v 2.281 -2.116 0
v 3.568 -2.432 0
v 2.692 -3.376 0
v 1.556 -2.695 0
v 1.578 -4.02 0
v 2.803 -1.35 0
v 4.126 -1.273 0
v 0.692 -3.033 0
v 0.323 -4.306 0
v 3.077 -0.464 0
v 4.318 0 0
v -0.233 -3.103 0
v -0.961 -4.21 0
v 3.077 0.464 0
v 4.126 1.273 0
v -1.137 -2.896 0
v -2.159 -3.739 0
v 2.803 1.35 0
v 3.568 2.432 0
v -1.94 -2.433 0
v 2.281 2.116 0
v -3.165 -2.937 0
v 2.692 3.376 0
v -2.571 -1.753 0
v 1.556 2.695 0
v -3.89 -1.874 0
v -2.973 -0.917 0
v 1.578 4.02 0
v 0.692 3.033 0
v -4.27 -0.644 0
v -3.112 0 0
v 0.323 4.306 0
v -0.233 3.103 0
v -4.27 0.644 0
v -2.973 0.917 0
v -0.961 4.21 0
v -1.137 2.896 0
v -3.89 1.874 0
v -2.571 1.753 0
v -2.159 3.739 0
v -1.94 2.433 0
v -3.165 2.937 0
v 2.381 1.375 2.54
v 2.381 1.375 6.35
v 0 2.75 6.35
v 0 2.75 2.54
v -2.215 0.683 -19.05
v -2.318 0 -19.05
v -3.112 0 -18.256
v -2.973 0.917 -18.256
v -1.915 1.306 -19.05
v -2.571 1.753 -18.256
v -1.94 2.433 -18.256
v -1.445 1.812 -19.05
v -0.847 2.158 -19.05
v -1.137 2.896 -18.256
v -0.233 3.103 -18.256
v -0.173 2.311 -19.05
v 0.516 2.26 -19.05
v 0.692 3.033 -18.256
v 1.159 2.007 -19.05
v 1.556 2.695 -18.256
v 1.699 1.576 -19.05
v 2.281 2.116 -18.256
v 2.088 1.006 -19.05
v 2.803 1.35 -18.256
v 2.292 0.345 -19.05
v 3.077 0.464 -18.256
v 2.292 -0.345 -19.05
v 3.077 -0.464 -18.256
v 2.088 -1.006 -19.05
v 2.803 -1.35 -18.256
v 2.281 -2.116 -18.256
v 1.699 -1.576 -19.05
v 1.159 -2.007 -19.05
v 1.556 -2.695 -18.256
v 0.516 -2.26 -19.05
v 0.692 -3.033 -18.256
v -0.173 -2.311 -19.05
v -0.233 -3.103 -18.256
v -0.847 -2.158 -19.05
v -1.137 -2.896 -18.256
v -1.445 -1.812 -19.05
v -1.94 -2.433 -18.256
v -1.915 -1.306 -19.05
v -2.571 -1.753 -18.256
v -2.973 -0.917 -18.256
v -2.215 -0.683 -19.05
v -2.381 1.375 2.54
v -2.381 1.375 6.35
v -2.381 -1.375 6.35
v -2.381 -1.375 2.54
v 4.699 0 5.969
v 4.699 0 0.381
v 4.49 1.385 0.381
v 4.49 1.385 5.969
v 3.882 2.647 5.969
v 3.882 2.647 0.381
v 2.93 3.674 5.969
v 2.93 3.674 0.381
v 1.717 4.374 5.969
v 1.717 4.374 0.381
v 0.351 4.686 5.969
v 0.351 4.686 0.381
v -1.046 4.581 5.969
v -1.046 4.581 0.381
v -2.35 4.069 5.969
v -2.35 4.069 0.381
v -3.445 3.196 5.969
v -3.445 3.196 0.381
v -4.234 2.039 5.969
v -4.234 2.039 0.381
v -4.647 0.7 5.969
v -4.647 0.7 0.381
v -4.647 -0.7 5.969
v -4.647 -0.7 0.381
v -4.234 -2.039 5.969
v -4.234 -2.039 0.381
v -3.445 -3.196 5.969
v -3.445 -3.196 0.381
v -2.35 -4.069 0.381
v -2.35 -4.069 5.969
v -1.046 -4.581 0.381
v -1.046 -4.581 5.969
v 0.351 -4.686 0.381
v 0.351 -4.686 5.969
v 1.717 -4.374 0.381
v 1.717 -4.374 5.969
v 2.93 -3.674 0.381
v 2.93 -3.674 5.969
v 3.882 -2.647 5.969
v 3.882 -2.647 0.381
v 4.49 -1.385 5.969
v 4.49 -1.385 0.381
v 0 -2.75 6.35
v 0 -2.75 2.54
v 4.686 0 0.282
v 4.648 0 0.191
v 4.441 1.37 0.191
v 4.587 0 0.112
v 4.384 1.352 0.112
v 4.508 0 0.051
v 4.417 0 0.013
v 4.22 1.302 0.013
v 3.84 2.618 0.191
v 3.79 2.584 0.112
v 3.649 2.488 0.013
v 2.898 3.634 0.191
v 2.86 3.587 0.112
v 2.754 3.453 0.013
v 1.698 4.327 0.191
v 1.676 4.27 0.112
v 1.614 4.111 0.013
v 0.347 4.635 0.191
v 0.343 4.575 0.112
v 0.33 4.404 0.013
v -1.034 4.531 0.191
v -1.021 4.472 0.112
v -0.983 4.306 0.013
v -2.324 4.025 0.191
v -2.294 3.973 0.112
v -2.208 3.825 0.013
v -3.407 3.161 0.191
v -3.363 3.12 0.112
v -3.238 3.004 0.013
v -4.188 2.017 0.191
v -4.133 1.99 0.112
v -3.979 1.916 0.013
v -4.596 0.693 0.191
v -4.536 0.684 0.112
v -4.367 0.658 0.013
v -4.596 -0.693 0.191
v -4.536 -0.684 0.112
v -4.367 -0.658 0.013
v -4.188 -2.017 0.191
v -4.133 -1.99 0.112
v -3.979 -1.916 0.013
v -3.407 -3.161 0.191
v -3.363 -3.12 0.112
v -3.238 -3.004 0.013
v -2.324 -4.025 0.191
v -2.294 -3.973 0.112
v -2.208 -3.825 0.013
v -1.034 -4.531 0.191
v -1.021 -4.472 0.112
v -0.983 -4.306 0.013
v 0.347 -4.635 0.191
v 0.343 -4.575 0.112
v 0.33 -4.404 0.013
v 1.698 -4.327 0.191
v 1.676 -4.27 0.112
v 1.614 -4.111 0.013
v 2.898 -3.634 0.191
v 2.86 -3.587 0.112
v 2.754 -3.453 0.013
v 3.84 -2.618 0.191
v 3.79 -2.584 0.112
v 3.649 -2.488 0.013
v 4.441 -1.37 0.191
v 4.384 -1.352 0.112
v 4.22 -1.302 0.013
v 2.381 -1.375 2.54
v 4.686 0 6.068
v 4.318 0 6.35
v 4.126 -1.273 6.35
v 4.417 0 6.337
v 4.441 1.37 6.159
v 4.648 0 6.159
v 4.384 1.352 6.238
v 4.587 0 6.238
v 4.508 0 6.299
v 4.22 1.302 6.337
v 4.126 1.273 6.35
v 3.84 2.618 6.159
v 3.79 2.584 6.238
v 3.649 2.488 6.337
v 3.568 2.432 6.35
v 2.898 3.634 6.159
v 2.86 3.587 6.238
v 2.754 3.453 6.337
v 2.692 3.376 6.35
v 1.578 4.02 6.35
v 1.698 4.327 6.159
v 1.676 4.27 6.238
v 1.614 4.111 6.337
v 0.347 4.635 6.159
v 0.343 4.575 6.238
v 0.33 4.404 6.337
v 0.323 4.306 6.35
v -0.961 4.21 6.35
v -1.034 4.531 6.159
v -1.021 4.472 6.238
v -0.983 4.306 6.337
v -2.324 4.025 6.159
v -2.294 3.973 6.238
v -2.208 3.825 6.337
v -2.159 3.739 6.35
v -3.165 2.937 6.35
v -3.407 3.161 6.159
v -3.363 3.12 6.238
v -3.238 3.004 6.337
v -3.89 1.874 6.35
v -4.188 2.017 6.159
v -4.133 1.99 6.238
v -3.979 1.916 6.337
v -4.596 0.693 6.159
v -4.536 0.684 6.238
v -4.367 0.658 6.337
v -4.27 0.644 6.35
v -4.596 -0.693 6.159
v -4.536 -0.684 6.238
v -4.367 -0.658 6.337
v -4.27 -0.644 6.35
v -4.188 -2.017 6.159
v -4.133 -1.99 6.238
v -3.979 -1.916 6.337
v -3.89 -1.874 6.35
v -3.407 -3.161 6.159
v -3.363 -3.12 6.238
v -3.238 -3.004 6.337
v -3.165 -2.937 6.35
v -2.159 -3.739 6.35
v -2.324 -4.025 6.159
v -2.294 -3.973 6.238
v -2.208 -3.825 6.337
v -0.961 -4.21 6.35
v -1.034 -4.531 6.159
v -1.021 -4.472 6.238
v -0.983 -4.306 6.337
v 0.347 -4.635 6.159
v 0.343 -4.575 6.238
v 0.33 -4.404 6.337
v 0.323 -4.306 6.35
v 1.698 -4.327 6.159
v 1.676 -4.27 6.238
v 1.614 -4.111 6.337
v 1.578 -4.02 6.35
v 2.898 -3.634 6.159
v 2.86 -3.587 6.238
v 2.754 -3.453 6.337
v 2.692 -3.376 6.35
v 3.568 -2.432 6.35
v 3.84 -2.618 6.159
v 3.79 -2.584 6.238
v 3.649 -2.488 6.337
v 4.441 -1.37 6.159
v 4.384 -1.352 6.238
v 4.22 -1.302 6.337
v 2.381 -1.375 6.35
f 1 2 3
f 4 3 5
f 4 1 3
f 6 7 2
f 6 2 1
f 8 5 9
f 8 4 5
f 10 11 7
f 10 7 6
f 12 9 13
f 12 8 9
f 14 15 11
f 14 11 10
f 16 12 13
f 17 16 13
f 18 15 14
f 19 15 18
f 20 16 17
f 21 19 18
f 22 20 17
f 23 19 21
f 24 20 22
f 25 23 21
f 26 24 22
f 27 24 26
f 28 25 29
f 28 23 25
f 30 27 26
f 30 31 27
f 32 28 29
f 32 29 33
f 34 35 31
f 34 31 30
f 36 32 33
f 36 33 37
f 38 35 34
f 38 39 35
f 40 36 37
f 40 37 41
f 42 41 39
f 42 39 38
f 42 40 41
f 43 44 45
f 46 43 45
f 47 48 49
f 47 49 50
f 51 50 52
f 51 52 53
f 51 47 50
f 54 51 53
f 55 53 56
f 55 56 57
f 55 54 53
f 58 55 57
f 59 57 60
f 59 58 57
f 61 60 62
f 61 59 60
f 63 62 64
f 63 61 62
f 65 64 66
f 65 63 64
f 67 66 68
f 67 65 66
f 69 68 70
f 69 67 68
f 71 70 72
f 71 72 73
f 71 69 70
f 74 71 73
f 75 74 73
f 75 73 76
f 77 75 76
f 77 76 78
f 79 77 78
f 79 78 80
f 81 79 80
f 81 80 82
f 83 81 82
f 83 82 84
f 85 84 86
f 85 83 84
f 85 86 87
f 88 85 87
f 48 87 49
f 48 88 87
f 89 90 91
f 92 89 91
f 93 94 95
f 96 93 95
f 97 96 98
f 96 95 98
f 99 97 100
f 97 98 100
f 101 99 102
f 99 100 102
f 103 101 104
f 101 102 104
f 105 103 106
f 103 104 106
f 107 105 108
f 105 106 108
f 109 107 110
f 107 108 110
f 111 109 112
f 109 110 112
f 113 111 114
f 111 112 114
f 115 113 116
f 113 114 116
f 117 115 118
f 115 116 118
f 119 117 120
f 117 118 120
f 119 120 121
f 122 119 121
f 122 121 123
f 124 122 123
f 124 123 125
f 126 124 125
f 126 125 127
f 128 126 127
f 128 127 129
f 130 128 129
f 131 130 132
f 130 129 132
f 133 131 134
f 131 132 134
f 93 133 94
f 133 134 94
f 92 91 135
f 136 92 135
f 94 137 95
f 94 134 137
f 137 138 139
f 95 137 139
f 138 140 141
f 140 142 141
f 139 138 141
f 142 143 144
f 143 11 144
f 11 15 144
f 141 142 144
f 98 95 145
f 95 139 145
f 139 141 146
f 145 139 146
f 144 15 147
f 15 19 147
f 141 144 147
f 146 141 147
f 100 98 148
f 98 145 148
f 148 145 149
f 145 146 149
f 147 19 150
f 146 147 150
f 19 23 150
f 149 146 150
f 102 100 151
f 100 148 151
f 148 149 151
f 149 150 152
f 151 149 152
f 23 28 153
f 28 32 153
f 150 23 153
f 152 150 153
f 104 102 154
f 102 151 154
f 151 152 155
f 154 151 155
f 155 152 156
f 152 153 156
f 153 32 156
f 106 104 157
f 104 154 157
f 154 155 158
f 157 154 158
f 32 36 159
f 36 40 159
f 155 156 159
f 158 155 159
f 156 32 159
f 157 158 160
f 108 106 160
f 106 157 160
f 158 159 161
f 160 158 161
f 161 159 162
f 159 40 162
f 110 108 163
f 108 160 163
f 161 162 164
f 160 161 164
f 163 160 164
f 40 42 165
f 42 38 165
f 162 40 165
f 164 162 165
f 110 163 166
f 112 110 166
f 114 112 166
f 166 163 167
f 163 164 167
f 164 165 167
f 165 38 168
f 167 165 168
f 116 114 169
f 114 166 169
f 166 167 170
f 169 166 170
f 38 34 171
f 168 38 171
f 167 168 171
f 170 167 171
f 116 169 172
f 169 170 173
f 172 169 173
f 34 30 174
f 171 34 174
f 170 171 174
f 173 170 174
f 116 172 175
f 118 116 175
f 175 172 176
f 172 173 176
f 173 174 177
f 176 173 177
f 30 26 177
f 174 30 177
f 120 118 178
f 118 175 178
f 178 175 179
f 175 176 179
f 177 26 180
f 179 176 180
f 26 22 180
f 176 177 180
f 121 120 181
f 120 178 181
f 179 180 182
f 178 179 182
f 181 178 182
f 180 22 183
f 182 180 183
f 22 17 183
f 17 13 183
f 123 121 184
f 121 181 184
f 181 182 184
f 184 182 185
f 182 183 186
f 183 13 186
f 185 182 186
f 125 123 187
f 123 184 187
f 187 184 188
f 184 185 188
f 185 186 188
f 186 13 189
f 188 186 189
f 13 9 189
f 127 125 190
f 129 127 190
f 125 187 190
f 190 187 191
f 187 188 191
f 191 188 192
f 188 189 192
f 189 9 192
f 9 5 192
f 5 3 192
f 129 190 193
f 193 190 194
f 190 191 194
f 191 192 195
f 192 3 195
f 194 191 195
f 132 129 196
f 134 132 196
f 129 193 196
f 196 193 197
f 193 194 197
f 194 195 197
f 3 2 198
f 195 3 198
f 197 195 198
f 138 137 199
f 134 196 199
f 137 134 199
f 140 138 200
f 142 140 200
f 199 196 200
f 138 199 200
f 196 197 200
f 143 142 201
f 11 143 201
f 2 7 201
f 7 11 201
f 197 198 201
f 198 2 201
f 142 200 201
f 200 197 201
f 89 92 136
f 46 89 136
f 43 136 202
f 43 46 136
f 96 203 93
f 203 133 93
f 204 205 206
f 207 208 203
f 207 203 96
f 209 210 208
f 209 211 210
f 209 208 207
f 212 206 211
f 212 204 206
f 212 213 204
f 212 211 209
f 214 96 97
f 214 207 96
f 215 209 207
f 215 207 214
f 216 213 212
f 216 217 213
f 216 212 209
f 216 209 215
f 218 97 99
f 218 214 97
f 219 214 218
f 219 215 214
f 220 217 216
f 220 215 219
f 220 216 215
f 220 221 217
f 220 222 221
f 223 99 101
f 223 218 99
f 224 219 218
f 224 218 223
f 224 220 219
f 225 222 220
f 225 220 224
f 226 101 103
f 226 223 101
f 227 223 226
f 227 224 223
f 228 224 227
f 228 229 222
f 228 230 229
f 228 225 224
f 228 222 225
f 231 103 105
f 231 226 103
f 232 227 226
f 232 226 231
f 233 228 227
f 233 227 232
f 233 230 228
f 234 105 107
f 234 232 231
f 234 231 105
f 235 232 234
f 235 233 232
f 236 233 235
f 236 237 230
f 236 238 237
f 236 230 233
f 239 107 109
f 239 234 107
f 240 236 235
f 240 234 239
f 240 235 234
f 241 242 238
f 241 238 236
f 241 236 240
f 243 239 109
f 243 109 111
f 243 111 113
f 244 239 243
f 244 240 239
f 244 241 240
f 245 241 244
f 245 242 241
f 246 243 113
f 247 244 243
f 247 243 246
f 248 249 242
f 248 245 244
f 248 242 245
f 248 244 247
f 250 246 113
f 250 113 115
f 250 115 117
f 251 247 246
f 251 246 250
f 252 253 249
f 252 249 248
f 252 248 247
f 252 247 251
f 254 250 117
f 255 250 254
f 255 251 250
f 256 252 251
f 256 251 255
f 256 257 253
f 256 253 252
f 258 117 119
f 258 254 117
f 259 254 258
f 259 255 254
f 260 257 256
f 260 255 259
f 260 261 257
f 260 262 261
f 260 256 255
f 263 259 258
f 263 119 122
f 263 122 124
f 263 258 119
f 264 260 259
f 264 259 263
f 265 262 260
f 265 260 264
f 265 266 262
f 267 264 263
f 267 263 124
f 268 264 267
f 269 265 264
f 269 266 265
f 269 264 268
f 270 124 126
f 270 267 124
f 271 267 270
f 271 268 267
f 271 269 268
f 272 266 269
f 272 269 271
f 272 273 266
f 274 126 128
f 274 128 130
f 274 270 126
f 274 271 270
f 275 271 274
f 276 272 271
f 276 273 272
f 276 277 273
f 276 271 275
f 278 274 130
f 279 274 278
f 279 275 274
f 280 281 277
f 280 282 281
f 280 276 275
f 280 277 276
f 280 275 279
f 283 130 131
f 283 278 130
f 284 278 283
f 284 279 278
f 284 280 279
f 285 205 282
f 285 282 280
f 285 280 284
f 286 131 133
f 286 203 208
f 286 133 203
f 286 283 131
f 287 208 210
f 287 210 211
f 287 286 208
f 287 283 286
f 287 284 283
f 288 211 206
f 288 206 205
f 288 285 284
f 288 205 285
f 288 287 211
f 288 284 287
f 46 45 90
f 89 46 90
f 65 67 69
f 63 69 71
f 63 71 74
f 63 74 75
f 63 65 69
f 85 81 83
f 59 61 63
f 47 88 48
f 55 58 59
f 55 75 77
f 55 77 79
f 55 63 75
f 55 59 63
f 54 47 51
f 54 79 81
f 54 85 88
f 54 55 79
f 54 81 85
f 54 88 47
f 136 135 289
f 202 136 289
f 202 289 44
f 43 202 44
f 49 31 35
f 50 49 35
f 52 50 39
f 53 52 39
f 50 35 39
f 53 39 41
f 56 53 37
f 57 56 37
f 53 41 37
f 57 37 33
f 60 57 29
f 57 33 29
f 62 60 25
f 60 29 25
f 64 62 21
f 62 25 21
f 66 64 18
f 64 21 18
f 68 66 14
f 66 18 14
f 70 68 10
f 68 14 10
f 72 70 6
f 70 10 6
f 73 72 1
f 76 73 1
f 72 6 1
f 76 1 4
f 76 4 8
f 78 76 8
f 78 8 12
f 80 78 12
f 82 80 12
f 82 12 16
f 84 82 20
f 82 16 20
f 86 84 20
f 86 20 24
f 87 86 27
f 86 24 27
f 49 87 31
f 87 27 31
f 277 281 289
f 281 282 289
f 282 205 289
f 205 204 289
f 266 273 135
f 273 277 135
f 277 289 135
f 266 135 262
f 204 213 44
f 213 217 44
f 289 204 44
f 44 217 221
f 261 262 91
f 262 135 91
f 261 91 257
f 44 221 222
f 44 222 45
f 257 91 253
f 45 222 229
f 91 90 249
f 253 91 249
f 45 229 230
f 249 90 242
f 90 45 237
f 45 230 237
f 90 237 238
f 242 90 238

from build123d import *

# Parameters (mm, degrees)
SKETCH1_W      = 4.699
SKETCH1_H      = 6.35
SKETCH2_R      = 3.1115
EXTRUDE1_DEPTH = 19.05
EXTRUDE2_DEPTH = 3.81
CHAMFER1_SIZE2 = 0.793750001
CHAMFER1_SIZE  = 0.793749999
FILLET1_R      = 0.381
FILLET2_R      = 0.381


with BuildPart() as part:
    # Sketch1 → Revolve1 (revolve)
    with BuildSketch(Plane(origin=(0, 0, 0), x_dir=(1, 0, 0), z_dir=(0, 1, 0))):
        with Locations((2.3495, -3.175)):
            Rectangle(SKETCH1_W, SKETCH1_H)
    revolve(axis=Axis((0, 0, 0), (0, 0, 1)))

    # Sketch2 → Extrude1 (add)
    with BuildSketch(Plane(origin=(0, 0, 0), x_dir=(-1, 0, 0), z_dir=(0, 0, -1))):
        Circle(SKETCH2_R)
    extrude(amount=EXTRUDE1_DEPTH)

    # Sketch3 → Extrude2 (cut)
    with BuildSketch(Plane.XY.offset(6.35)):
        Polygon((2.38125, 1.374815329), (0, 2.749630657), (-2.38125, 1.374815329), (-2.38125, -1.374815329), (0, -2.749630657), (2.38125, -1.374815329), align=None)
    extrude(amount=-EXTRUDE2_DEPTH, mode=Mode.SUBTRACT)

    # Chamfer1
    chamfer1_edges = [part.edges().sort_by_distance(p)[0] for p in [
        (3.1115, 0, -19.05),
    ]]
    chamfer(chamfer1_edges, length=CHAMFER1_SIZE, length2=CHAMFER1_SIZE2)

    # Fillet1
    fillet1_edges = [part.edges().sort_by_distance(p)[0] for p in [
        (-4.699, 0, 6.35),
    ]]
    fillet(fillet1_edges, radius=FILLET1_R)

    # Fillet2
    fillet2_edges = [part.edges().sort_by_distance(p)[0] for p in [
        (-4.699, 0, 0),
    ]]
    fillet(fillet2_edges, radius=FILLET2_R)


solid = part.part
